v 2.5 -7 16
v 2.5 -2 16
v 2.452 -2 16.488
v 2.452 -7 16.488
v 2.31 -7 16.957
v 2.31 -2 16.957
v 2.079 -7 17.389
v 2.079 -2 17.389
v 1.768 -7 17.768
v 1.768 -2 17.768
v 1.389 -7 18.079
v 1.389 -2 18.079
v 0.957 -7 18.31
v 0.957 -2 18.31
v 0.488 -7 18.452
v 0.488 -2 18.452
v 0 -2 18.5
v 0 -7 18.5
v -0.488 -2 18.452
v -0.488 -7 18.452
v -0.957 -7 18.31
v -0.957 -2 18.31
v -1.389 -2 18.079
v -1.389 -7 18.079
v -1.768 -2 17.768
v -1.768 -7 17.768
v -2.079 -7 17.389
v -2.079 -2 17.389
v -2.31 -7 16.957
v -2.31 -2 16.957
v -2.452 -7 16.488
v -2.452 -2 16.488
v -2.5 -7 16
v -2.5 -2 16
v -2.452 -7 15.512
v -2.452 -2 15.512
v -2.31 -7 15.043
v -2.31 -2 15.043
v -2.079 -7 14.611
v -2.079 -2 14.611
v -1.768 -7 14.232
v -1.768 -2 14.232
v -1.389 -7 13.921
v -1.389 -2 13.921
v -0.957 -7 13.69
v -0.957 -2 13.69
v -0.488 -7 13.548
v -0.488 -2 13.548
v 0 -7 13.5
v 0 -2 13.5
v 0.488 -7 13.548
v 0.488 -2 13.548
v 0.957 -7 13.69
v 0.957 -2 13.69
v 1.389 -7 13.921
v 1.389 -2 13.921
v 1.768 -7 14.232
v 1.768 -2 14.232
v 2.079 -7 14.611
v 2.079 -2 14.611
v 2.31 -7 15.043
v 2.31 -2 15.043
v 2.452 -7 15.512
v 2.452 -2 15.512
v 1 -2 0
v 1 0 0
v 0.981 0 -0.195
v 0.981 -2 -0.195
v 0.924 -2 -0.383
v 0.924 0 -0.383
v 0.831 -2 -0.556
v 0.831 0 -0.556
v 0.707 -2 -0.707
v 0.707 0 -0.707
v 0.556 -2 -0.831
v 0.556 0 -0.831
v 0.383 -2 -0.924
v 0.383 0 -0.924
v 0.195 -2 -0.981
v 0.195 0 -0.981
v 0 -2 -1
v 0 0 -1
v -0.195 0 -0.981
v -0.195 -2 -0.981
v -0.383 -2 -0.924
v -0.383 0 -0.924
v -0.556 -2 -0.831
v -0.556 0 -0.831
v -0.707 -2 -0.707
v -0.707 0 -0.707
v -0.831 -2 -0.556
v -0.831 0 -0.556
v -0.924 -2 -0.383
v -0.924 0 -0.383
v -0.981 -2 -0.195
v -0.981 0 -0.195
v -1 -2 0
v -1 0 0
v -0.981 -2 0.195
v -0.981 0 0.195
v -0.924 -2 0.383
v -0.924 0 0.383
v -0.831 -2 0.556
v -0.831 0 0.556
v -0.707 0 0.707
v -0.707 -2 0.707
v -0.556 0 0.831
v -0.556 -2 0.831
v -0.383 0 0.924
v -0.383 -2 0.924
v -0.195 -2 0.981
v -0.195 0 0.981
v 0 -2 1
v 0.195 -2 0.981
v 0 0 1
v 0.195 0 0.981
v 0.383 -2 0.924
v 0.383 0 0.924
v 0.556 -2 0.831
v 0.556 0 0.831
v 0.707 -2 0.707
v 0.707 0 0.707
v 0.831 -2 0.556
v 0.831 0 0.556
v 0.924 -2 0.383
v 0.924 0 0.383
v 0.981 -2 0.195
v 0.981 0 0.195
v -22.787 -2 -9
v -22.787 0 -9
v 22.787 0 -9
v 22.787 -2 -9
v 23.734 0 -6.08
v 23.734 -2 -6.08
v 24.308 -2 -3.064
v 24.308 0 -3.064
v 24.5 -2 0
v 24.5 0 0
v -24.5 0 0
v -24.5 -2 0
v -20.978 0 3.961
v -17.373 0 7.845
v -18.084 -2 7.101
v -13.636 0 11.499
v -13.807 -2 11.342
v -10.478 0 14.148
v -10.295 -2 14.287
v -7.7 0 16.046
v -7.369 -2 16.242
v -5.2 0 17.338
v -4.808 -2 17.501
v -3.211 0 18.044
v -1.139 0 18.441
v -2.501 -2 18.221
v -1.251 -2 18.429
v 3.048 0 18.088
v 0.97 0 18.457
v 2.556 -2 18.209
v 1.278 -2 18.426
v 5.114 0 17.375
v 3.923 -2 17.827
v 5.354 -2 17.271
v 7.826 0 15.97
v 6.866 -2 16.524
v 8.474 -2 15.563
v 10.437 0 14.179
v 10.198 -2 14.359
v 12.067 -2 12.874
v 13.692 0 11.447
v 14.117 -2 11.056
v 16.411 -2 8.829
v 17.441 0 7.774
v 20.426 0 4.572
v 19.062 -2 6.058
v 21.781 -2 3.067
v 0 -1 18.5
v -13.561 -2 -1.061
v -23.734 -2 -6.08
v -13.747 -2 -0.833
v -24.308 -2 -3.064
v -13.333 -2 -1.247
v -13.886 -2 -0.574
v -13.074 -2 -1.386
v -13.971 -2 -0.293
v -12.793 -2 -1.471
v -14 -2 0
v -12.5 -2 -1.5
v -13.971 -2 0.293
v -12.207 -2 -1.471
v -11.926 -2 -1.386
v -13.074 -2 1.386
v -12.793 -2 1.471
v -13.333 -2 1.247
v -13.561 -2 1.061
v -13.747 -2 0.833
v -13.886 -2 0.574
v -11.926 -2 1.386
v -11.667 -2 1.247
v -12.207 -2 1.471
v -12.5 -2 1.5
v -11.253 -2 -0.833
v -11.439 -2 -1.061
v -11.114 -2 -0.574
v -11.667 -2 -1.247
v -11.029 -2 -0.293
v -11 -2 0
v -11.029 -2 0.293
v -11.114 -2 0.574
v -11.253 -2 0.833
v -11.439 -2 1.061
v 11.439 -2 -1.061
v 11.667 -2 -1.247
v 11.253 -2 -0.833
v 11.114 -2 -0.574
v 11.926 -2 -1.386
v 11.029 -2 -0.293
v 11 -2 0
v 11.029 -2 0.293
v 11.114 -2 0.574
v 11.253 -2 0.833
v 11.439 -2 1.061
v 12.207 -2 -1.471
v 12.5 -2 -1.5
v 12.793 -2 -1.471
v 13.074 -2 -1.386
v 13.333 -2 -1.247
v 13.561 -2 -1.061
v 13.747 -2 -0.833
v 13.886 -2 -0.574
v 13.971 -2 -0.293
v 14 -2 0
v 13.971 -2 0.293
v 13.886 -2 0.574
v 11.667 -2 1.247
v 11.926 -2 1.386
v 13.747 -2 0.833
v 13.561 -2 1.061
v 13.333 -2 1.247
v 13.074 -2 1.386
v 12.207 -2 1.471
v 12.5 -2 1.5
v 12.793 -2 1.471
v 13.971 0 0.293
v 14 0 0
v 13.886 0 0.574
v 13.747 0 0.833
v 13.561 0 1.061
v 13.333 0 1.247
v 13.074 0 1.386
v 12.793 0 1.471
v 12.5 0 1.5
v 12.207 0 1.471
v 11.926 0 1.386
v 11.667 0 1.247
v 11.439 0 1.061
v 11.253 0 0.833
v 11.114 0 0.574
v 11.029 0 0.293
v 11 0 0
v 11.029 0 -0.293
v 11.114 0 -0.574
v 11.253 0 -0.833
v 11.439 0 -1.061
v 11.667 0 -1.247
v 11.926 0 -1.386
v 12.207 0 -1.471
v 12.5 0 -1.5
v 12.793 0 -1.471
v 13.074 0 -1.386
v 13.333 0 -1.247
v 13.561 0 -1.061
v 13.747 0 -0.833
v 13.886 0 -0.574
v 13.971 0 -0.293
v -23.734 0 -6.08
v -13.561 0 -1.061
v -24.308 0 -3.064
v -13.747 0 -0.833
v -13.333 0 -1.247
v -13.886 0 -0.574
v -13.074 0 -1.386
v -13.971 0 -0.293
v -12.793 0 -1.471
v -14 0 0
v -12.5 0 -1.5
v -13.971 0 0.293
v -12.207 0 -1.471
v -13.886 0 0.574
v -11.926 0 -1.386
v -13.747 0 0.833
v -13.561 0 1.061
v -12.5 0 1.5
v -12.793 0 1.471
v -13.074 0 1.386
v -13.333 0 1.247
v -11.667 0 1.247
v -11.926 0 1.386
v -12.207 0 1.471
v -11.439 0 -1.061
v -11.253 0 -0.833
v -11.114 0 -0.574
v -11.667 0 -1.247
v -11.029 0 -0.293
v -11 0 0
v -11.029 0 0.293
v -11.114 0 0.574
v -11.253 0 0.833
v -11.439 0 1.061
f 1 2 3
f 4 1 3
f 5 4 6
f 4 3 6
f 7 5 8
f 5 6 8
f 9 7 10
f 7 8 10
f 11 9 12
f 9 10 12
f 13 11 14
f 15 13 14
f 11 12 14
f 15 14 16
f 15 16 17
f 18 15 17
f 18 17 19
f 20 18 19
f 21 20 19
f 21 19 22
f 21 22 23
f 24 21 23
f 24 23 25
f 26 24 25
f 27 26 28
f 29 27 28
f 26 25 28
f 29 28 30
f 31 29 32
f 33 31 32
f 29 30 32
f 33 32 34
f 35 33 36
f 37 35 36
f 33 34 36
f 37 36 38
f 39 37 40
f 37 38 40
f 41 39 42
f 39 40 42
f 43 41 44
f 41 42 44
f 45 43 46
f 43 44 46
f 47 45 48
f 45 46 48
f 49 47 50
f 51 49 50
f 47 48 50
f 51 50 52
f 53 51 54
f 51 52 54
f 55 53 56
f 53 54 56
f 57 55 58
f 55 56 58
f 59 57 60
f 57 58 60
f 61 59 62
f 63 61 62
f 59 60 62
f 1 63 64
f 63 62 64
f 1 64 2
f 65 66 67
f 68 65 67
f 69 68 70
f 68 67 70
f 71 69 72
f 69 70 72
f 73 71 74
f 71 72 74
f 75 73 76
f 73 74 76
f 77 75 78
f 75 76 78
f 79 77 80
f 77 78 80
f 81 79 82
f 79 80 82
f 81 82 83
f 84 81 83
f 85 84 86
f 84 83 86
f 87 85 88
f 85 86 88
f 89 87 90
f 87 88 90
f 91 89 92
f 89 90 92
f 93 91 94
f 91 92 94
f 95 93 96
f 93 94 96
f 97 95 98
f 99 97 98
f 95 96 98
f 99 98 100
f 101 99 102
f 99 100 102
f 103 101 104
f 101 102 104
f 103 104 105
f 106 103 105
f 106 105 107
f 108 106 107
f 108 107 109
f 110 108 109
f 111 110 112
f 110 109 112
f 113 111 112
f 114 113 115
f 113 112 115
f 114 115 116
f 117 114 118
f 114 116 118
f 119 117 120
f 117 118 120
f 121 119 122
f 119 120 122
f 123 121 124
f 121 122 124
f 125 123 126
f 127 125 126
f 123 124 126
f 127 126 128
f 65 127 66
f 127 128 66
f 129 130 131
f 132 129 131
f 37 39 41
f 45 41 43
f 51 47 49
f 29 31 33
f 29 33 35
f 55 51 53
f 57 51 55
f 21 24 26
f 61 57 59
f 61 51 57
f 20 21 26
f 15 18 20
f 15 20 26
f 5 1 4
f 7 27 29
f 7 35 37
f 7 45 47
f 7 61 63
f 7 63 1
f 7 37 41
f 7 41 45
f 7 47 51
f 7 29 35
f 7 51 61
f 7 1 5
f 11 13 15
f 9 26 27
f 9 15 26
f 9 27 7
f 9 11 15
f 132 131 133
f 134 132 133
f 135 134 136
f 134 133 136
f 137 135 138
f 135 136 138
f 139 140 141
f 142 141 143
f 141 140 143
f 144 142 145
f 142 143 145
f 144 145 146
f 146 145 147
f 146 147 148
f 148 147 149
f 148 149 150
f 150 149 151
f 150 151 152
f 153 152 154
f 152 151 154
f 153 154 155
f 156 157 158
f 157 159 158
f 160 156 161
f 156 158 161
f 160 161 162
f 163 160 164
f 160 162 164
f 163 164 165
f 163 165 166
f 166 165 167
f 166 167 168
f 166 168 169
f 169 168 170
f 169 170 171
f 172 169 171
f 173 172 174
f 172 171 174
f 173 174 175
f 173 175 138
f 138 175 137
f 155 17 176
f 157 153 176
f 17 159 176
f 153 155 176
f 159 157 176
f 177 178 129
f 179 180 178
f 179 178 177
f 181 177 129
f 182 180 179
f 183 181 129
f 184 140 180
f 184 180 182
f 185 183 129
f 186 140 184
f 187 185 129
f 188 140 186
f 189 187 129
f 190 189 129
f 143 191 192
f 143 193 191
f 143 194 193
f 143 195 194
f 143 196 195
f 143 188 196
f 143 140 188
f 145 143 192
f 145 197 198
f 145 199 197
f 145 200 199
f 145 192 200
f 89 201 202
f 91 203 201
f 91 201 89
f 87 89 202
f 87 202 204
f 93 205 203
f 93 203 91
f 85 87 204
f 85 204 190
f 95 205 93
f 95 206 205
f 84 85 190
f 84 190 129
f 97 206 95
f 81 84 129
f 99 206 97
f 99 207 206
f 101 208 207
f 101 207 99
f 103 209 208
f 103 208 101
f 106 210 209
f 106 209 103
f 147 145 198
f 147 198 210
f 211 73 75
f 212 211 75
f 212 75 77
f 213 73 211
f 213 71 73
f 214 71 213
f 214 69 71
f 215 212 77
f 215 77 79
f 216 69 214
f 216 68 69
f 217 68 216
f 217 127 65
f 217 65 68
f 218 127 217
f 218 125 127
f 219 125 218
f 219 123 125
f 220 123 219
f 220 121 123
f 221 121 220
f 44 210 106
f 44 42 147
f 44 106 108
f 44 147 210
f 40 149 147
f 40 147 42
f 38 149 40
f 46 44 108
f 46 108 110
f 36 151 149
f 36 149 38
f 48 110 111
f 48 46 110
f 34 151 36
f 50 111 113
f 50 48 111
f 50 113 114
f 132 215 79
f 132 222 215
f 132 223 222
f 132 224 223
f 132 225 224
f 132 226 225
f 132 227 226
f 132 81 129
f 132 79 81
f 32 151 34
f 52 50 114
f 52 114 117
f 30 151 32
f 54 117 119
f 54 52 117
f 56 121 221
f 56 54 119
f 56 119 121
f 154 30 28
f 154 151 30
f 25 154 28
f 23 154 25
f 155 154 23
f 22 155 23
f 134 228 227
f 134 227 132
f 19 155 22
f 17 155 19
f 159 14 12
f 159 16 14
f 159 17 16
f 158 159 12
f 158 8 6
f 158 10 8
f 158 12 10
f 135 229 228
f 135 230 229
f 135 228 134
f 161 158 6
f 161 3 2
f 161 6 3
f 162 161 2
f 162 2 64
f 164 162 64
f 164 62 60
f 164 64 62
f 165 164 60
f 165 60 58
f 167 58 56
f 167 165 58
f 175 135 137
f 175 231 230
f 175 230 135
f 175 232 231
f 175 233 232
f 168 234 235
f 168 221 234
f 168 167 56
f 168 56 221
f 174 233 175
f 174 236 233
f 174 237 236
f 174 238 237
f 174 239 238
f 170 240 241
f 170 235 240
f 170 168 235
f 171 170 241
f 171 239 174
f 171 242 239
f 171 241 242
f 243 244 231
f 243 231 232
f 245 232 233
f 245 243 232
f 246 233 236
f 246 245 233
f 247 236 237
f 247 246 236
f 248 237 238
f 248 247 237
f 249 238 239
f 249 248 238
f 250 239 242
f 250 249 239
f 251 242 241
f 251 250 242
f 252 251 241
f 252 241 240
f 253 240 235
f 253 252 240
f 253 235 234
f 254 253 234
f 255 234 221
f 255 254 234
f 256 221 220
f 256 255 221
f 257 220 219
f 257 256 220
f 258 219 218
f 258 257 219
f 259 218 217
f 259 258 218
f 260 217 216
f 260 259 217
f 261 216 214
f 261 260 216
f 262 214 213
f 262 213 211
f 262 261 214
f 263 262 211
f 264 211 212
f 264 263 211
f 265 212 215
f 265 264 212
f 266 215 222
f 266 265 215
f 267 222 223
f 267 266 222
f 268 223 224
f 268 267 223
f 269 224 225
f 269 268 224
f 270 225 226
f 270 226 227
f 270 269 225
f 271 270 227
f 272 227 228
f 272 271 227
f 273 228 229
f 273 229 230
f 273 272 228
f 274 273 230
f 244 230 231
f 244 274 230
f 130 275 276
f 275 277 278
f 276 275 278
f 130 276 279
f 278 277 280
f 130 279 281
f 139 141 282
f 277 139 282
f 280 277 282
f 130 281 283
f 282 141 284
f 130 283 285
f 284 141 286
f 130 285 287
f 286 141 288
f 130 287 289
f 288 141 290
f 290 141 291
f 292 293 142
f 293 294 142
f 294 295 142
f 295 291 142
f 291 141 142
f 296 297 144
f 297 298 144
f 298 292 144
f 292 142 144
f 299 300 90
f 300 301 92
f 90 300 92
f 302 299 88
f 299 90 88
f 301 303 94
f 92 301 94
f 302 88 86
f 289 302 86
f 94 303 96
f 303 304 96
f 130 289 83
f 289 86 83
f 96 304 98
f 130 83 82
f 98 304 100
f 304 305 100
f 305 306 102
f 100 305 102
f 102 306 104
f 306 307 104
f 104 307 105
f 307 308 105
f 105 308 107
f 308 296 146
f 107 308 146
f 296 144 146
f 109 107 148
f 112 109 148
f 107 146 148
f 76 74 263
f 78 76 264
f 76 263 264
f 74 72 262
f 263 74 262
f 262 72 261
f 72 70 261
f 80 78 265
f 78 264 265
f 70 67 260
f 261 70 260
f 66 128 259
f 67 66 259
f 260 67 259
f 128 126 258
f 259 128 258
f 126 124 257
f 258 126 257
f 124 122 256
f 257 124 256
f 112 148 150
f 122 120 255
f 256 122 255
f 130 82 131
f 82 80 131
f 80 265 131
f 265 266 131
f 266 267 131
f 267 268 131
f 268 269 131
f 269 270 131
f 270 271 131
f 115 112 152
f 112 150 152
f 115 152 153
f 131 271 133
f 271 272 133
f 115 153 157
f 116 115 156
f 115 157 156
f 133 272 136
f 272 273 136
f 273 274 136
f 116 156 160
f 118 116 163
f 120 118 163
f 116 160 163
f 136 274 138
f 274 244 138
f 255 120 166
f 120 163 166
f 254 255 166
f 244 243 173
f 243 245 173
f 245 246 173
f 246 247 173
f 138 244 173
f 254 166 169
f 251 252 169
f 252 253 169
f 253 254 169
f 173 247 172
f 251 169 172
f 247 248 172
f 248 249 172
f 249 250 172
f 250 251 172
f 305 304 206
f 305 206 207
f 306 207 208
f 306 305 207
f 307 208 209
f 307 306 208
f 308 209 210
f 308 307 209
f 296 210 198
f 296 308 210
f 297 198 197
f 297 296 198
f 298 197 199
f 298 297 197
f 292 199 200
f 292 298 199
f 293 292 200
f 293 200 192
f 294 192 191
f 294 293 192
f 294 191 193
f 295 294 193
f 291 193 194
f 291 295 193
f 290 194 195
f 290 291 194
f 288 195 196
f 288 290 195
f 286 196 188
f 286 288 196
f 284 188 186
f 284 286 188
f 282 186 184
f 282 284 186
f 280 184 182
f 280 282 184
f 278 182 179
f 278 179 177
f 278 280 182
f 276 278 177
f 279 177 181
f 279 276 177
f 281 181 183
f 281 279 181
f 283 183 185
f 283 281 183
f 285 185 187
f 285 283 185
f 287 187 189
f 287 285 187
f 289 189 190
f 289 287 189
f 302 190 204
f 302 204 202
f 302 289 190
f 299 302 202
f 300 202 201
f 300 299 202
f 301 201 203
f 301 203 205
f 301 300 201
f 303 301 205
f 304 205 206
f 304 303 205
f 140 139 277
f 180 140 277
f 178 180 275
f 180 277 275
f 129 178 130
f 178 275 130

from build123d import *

# Parameters (mm, degrees)
F0_R     = 1.5
F1_DEPTH = 2
F2_R     = 2.5
F3_DEPTH = 5
F5_DEPTH = 25


with BuildPart() as f1:
    # F0 (on Front) → F1 (new body)
    with BuildSketch(Plane.XZ):
        with BuildLine():
            ThreePointArc((22.7870577302, -9), (24.0679549857, -4.5807797158), (24.5, 0))
            ThreePointArc((24.5, 0), (-4.5807797158, 24.0679549857), (-22.7870577302, -9))
            Line((-22.7870577302, -9), (0, -9))
            Line((0, -9), (22.7870577302, -9))
        make_face()
        with Locations((-12.5, 0)):
            Circle(F0_R, mode=Mode.SUBTRACT)
        with BuildLine():
            ThreePointArc((1, 0), (0.7071067812, -0.7071067812), (0, -1))
            ThreePointArc((0, -1), (-0.7071067812, 0.7071067812), (1, 0))
        make_face(mode=Mode.SUBTRACT)
        with Locations((12.5, 0)):
            Circle(F0_R, mode=Mode.SUBTRACT)
    extrude(amount=F1_DEPTH)

    # F2 (on face) → F3 (join)
    with BuildSketch(Plane.XZ.offset(2)):
        with Locations((0, 16)):
            Circle(F2_R)
    extrude(amount=F3_DEPTH)

    # F4 (on face) → F5 (cut)
    with BuildSketch(Plane.XZ.offset(2)):
        with BuildLine():
            ThreePointArc((24.5, 0), (0, 24.5), (-24.5, 0))
            add(Edge.make_bspline(
                [(-24.5, 0), (-16.3333333333, 9.25), (-8.1666666667, 18.5), (0, 18.5)],
                knots=[0, 0, 0, 0, 0.5, 0.5, 0.5, 0.5], degree=3))
            add(Edge.make_bspline(
                [(0, 18.5), (8.1666666667, 18.5), (16.3333333333, 9.25), (24.5, 0)],
                knots=[0.5, 0.5, 0.5, 0.5, 1, 1, 1, 1], degree=3))
        make_face()
    extrude(amount=-F5_DEPTH, mode=Mode.SUBTRACT)


solid = f1.part
